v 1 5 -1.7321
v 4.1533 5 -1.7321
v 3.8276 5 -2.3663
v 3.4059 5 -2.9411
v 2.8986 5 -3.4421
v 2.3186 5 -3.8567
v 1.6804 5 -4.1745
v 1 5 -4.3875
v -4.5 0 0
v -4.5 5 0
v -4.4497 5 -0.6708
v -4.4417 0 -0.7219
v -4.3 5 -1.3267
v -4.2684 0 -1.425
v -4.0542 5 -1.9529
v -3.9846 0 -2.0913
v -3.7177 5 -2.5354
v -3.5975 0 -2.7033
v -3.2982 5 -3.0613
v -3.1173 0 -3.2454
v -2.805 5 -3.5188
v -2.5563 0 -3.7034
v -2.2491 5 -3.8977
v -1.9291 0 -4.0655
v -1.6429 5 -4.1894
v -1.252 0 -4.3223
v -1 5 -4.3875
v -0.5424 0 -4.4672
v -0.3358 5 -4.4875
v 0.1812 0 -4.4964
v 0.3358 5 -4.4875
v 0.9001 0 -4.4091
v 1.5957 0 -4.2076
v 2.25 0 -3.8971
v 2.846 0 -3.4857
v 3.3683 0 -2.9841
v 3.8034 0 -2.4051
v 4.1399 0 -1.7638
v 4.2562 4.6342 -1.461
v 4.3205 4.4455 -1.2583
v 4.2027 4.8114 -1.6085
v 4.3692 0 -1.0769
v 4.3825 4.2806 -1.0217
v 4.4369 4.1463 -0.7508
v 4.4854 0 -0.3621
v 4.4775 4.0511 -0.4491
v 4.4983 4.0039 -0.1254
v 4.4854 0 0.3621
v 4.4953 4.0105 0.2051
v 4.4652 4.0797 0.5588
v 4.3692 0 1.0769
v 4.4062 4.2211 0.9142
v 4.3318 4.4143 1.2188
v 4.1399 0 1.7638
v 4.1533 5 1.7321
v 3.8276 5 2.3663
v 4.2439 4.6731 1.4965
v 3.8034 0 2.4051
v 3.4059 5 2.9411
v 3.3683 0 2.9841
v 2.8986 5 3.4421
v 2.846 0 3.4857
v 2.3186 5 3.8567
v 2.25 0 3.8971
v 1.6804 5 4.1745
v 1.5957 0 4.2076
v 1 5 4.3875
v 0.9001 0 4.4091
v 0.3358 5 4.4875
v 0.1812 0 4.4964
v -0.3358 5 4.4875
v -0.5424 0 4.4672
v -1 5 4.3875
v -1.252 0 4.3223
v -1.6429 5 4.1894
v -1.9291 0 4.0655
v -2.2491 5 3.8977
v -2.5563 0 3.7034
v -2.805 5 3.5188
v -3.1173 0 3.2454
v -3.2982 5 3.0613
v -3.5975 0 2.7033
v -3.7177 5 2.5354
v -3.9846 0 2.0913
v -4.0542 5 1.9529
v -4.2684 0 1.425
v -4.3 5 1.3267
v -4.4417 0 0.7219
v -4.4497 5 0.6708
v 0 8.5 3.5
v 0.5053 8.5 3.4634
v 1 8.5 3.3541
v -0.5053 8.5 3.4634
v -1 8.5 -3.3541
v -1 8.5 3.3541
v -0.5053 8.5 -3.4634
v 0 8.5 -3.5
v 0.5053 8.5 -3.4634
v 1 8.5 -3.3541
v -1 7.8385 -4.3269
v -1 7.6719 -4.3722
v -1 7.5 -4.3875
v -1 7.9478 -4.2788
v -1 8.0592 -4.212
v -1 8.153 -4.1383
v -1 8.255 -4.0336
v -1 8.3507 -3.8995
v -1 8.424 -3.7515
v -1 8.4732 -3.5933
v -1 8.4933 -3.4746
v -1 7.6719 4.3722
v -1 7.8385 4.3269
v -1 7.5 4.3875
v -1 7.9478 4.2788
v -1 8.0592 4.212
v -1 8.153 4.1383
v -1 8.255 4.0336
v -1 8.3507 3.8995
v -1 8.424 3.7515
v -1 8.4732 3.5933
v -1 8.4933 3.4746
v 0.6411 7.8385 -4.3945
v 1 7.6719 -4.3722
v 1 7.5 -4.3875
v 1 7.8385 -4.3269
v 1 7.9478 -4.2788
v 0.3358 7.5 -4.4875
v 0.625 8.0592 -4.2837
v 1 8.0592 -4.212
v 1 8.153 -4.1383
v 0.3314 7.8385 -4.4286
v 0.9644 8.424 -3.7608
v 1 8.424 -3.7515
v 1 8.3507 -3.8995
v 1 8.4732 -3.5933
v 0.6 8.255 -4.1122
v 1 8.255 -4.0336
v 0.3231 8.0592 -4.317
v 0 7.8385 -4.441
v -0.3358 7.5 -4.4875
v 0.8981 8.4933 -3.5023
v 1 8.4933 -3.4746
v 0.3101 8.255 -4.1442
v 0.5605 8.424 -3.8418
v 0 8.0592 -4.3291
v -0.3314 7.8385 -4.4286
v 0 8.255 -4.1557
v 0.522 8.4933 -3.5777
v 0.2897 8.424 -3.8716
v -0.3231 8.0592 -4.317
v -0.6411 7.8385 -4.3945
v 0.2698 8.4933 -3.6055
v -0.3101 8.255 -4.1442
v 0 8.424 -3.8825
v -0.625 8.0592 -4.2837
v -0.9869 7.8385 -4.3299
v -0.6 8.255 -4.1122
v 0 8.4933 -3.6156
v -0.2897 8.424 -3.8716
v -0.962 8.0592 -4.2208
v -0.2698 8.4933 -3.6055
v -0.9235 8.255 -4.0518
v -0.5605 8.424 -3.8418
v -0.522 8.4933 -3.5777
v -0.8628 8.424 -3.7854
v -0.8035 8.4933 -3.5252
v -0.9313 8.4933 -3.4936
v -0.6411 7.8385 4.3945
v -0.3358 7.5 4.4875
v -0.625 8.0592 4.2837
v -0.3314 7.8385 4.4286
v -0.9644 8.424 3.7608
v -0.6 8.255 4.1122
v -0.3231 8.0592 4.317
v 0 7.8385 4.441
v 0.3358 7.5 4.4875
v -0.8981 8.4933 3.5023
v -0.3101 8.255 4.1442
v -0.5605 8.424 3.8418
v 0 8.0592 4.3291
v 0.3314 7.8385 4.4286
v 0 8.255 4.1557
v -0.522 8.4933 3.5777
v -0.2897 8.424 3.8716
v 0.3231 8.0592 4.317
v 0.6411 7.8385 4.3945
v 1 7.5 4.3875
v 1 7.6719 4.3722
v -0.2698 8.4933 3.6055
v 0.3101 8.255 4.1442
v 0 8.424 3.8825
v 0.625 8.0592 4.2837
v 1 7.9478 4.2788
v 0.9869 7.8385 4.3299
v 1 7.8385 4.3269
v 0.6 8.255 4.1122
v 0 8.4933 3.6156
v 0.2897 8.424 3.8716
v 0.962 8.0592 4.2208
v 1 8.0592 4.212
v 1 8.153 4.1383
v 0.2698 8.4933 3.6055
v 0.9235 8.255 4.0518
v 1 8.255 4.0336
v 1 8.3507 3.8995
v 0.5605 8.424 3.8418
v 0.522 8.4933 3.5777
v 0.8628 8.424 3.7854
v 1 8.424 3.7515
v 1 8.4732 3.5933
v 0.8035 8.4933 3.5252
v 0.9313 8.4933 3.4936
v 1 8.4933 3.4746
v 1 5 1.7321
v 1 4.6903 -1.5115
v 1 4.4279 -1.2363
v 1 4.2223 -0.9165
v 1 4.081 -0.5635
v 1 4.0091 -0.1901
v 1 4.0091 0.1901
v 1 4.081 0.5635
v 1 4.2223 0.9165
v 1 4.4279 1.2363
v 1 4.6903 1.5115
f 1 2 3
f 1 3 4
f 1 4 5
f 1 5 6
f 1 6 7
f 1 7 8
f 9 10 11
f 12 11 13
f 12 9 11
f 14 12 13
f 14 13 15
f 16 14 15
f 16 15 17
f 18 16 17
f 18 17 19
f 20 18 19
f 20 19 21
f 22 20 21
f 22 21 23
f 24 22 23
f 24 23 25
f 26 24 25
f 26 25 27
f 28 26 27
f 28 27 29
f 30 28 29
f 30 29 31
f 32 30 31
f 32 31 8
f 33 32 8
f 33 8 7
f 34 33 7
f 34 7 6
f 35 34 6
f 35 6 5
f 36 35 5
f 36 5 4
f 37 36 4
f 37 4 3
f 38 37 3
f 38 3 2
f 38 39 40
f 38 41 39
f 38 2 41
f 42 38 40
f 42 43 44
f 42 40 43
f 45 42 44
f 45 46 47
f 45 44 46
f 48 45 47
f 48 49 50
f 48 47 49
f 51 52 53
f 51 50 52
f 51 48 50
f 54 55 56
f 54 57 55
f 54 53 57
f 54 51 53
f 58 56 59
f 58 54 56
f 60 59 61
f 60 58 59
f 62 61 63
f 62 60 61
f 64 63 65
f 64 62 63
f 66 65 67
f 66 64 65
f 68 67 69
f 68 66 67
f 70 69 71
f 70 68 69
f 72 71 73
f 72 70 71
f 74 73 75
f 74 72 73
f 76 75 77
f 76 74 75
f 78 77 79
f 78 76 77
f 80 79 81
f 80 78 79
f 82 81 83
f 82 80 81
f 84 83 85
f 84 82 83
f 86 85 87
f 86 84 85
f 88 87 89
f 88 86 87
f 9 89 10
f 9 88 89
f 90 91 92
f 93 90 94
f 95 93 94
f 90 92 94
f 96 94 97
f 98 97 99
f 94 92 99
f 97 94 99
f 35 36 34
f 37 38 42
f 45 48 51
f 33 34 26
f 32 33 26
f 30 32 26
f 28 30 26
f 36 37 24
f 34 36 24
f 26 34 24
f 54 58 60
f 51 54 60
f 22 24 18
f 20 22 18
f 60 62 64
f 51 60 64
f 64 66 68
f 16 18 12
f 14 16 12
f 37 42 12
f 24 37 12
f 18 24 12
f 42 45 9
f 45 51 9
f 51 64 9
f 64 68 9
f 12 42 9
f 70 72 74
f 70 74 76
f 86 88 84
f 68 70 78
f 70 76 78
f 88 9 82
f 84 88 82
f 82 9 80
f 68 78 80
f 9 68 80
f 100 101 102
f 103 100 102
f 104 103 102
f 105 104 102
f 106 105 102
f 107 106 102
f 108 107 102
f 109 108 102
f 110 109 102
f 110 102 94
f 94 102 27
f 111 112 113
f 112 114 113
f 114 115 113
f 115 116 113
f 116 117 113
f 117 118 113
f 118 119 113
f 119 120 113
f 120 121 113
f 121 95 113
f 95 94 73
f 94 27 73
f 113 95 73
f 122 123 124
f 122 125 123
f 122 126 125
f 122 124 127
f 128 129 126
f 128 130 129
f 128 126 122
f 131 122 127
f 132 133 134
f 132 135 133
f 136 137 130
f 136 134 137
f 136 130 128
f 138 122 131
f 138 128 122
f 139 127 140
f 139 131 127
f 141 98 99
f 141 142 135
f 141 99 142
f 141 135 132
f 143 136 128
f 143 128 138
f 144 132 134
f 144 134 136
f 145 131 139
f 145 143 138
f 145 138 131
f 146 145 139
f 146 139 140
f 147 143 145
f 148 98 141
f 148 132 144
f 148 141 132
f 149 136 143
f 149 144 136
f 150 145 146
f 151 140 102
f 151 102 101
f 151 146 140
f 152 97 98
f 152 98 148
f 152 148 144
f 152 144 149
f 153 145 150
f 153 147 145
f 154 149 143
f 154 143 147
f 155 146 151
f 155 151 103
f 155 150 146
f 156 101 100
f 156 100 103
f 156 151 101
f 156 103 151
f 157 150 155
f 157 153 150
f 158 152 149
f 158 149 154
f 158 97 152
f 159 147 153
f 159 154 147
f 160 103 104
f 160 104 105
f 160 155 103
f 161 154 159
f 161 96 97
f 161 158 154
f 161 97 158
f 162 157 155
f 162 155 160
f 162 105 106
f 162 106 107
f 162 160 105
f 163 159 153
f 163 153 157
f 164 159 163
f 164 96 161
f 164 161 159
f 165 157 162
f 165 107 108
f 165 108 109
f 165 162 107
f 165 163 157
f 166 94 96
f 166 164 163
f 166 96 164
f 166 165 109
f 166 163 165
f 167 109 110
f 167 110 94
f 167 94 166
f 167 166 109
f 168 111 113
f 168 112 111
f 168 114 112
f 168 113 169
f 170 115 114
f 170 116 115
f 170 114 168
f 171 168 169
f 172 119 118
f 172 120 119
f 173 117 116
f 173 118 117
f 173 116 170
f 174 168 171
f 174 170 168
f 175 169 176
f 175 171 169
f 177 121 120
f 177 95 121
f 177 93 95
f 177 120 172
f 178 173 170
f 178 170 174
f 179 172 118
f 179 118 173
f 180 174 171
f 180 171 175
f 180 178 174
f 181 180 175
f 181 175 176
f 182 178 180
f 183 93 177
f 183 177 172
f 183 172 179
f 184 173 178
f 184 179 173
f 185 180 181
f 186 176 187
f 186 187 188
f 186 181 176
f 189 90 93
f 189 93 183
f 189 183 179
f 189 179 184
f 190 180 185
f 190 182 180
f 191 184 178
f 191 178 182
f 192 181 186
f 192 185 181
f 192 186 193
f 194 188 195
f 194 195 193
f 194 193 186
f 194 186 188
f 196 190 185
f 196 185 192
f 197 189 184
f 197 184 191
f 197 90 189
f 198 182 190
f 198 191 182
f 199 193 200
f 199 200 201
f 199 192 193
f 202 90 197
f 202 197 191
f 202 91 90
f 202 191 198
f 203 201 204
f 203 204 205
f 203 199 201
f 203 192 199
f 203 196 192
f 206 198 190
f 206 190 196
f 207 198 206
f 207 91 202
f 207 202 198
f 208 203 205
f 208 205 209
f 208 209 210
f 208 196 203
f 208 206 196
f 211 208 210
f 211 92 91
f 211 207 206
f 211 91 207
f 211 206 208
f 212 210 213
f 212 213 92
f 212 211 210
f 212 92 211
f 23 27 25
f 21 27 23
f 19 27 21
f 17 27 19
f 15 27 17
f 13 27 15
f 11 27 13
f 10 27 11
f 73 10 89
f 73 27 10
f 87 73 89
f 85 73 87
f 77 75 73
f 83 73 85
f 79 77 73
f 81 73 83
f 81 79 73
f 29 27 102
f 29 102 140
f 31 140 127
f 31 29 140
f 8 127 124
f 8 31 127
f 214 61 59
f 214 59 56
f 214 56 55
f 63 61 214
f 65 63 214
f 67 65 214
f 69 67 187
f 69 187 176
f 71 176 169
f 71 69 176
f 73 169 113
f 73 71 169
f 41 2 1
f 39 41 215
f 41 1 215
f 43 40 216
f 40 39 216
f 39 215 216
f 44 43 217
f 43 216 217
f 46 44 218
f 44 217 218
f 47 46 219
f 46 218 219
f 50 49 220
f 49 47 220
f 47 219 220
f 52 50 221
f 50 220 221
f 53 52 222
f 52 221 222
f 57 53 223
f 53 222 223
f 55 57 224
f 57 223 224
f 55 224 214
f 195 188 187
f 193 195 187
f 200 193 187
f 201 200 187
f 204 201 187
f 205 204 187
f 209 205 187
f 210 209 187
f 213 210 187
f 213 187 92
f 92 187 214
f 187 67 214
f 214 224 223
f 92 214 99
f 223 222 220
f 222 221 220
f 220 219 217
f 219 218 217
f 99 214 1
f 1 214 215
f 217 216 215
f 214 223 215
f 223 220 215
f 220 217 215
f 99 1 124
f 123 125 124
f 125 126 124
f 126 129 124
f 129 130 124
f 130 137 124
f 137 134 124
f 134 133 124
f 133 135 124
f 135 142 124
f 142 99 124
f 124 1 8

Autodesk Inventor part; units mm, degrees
ref_plane "YZ Plane" through (0, 0, 0) normal (1, 0, 0) x (0, 1, 0)
ref_plane "XZ Plane" through (0, 0, 0) normal (0, 1, 0) x (-1, 0, 0)
ref_plane "XY Plane" through (0, 0, 0) normal (0, 0, 1) x (1, 0, 0)
sketch "Sketch1" plane through (0, 0, 0) normal (0, 1, 0) x (-1, 0, 0)
  circle A0 centre (0, 0) radius 4.5
  dimension "d0" = 9
extrude "Extrusion1" add sketch "Sketch1" along normal blind 5
sketch "Sketch2" plane through (0, 5, 0) normal (0, 1, 0) x (1, 0, 0)
  circle A0 centre (0, 0) radius 4.5 projected
  line L0 (0, 0) -> (-1, 0)
  line L1 (-1, 0) -> (1, 0)
  line L2 (1, 0) -> (1, 8.5977)
  line L3 (1, 8.5977) -> (-1, 8.5977)
  line L4 (-1, 8.5977) -> (-1, -7.4697)
  line L5 (-1, -7.4697) -> (1, -7.4697)
  line L6 (1, -7.4697) -> (1, 8.5977)
  dimension "d4" = 1
  dimension "d5" = 2
extrude "Extrusion2" add sketch "Sketch2" along normal blind 5 contours L2 L1 L0 L4 A0 | A0 L4 L3 L2 | L6 L5 L4 A0 | A0 L4 L0 L1 L6
sketch "Sketch3" plane through (0, 5, 0) normal (0, -1, 0) x (1, 0, 0)
  arc A0 (1, 4.3875) -> (-1, 4.3875) centre (0, 0) ccw projected
  line L0 (1, 7.4697) -> (1, 4.3875) projected
  line L1 (-1, 7.4697) -> (1, 7.4697) projected
  line L2 (-1, 4.3875) -> (-1, 7.4697) projected
  arc A1 (-1, -4.3875) -> (1, -4.3875) centre (0, 0) ccw projected
  line L3 (-1, -8.5977) -> (-1, -4.3875) projected
  line L4 (1, -8.5977) -> (-1, -8.5977) projected
  line L5 (1, -4.3875) -> (1, -8.5977) projected
extrude "Extrusion3" cut sketch "Sketch3" against normal blind 5
sketch "Sketch7" plane through (1, 5, 4.3875) normal (1, 0, 0) x (0, 0, -1)
  line L0 (4.3875, 2) -> (4.3875, 1)
  circle A0 centre (4.3875, 1) radius 2
  point P0 (4.3875, -5)
  dimension "d20" = 1
  dimension "d21" = 4
extrude "Extrusion7" cut sketch "Sketch7" along normal blind 25.4
sketch "Sketch8" plane through (1, 5, -4.3875) normal (1, 0, 0) x (0, 0, -1)
  line L0 (0, 5) -> (-8.775, 5) projected
  line L1 (0, 5) -> (-8.775, 5)
  line L2 (-8.775, 5) -> (-10.2746, 5)
  line L3 (-10.2746, 5) -> (-10.2746, 3.5)
  line L4 (-10.2746, 3.5) -> (1.1183, 3.5)
  line L5 (1.1183, 3.5) -> (1.1183, 5)
  line L6 (1.1183, 5) -> (0, 5)
  point P0 (-4.3875, -5)
  dimension "d24" = 1.5
extrude "Extrusion8" cut sketch "Sketch8" against normal blind 25.4
fillet "Fillet2" radius 1 2 edges at (0, 8.5, 4.5) (0, 8.5, -4.5)
properties part number "PistonCylinder"
